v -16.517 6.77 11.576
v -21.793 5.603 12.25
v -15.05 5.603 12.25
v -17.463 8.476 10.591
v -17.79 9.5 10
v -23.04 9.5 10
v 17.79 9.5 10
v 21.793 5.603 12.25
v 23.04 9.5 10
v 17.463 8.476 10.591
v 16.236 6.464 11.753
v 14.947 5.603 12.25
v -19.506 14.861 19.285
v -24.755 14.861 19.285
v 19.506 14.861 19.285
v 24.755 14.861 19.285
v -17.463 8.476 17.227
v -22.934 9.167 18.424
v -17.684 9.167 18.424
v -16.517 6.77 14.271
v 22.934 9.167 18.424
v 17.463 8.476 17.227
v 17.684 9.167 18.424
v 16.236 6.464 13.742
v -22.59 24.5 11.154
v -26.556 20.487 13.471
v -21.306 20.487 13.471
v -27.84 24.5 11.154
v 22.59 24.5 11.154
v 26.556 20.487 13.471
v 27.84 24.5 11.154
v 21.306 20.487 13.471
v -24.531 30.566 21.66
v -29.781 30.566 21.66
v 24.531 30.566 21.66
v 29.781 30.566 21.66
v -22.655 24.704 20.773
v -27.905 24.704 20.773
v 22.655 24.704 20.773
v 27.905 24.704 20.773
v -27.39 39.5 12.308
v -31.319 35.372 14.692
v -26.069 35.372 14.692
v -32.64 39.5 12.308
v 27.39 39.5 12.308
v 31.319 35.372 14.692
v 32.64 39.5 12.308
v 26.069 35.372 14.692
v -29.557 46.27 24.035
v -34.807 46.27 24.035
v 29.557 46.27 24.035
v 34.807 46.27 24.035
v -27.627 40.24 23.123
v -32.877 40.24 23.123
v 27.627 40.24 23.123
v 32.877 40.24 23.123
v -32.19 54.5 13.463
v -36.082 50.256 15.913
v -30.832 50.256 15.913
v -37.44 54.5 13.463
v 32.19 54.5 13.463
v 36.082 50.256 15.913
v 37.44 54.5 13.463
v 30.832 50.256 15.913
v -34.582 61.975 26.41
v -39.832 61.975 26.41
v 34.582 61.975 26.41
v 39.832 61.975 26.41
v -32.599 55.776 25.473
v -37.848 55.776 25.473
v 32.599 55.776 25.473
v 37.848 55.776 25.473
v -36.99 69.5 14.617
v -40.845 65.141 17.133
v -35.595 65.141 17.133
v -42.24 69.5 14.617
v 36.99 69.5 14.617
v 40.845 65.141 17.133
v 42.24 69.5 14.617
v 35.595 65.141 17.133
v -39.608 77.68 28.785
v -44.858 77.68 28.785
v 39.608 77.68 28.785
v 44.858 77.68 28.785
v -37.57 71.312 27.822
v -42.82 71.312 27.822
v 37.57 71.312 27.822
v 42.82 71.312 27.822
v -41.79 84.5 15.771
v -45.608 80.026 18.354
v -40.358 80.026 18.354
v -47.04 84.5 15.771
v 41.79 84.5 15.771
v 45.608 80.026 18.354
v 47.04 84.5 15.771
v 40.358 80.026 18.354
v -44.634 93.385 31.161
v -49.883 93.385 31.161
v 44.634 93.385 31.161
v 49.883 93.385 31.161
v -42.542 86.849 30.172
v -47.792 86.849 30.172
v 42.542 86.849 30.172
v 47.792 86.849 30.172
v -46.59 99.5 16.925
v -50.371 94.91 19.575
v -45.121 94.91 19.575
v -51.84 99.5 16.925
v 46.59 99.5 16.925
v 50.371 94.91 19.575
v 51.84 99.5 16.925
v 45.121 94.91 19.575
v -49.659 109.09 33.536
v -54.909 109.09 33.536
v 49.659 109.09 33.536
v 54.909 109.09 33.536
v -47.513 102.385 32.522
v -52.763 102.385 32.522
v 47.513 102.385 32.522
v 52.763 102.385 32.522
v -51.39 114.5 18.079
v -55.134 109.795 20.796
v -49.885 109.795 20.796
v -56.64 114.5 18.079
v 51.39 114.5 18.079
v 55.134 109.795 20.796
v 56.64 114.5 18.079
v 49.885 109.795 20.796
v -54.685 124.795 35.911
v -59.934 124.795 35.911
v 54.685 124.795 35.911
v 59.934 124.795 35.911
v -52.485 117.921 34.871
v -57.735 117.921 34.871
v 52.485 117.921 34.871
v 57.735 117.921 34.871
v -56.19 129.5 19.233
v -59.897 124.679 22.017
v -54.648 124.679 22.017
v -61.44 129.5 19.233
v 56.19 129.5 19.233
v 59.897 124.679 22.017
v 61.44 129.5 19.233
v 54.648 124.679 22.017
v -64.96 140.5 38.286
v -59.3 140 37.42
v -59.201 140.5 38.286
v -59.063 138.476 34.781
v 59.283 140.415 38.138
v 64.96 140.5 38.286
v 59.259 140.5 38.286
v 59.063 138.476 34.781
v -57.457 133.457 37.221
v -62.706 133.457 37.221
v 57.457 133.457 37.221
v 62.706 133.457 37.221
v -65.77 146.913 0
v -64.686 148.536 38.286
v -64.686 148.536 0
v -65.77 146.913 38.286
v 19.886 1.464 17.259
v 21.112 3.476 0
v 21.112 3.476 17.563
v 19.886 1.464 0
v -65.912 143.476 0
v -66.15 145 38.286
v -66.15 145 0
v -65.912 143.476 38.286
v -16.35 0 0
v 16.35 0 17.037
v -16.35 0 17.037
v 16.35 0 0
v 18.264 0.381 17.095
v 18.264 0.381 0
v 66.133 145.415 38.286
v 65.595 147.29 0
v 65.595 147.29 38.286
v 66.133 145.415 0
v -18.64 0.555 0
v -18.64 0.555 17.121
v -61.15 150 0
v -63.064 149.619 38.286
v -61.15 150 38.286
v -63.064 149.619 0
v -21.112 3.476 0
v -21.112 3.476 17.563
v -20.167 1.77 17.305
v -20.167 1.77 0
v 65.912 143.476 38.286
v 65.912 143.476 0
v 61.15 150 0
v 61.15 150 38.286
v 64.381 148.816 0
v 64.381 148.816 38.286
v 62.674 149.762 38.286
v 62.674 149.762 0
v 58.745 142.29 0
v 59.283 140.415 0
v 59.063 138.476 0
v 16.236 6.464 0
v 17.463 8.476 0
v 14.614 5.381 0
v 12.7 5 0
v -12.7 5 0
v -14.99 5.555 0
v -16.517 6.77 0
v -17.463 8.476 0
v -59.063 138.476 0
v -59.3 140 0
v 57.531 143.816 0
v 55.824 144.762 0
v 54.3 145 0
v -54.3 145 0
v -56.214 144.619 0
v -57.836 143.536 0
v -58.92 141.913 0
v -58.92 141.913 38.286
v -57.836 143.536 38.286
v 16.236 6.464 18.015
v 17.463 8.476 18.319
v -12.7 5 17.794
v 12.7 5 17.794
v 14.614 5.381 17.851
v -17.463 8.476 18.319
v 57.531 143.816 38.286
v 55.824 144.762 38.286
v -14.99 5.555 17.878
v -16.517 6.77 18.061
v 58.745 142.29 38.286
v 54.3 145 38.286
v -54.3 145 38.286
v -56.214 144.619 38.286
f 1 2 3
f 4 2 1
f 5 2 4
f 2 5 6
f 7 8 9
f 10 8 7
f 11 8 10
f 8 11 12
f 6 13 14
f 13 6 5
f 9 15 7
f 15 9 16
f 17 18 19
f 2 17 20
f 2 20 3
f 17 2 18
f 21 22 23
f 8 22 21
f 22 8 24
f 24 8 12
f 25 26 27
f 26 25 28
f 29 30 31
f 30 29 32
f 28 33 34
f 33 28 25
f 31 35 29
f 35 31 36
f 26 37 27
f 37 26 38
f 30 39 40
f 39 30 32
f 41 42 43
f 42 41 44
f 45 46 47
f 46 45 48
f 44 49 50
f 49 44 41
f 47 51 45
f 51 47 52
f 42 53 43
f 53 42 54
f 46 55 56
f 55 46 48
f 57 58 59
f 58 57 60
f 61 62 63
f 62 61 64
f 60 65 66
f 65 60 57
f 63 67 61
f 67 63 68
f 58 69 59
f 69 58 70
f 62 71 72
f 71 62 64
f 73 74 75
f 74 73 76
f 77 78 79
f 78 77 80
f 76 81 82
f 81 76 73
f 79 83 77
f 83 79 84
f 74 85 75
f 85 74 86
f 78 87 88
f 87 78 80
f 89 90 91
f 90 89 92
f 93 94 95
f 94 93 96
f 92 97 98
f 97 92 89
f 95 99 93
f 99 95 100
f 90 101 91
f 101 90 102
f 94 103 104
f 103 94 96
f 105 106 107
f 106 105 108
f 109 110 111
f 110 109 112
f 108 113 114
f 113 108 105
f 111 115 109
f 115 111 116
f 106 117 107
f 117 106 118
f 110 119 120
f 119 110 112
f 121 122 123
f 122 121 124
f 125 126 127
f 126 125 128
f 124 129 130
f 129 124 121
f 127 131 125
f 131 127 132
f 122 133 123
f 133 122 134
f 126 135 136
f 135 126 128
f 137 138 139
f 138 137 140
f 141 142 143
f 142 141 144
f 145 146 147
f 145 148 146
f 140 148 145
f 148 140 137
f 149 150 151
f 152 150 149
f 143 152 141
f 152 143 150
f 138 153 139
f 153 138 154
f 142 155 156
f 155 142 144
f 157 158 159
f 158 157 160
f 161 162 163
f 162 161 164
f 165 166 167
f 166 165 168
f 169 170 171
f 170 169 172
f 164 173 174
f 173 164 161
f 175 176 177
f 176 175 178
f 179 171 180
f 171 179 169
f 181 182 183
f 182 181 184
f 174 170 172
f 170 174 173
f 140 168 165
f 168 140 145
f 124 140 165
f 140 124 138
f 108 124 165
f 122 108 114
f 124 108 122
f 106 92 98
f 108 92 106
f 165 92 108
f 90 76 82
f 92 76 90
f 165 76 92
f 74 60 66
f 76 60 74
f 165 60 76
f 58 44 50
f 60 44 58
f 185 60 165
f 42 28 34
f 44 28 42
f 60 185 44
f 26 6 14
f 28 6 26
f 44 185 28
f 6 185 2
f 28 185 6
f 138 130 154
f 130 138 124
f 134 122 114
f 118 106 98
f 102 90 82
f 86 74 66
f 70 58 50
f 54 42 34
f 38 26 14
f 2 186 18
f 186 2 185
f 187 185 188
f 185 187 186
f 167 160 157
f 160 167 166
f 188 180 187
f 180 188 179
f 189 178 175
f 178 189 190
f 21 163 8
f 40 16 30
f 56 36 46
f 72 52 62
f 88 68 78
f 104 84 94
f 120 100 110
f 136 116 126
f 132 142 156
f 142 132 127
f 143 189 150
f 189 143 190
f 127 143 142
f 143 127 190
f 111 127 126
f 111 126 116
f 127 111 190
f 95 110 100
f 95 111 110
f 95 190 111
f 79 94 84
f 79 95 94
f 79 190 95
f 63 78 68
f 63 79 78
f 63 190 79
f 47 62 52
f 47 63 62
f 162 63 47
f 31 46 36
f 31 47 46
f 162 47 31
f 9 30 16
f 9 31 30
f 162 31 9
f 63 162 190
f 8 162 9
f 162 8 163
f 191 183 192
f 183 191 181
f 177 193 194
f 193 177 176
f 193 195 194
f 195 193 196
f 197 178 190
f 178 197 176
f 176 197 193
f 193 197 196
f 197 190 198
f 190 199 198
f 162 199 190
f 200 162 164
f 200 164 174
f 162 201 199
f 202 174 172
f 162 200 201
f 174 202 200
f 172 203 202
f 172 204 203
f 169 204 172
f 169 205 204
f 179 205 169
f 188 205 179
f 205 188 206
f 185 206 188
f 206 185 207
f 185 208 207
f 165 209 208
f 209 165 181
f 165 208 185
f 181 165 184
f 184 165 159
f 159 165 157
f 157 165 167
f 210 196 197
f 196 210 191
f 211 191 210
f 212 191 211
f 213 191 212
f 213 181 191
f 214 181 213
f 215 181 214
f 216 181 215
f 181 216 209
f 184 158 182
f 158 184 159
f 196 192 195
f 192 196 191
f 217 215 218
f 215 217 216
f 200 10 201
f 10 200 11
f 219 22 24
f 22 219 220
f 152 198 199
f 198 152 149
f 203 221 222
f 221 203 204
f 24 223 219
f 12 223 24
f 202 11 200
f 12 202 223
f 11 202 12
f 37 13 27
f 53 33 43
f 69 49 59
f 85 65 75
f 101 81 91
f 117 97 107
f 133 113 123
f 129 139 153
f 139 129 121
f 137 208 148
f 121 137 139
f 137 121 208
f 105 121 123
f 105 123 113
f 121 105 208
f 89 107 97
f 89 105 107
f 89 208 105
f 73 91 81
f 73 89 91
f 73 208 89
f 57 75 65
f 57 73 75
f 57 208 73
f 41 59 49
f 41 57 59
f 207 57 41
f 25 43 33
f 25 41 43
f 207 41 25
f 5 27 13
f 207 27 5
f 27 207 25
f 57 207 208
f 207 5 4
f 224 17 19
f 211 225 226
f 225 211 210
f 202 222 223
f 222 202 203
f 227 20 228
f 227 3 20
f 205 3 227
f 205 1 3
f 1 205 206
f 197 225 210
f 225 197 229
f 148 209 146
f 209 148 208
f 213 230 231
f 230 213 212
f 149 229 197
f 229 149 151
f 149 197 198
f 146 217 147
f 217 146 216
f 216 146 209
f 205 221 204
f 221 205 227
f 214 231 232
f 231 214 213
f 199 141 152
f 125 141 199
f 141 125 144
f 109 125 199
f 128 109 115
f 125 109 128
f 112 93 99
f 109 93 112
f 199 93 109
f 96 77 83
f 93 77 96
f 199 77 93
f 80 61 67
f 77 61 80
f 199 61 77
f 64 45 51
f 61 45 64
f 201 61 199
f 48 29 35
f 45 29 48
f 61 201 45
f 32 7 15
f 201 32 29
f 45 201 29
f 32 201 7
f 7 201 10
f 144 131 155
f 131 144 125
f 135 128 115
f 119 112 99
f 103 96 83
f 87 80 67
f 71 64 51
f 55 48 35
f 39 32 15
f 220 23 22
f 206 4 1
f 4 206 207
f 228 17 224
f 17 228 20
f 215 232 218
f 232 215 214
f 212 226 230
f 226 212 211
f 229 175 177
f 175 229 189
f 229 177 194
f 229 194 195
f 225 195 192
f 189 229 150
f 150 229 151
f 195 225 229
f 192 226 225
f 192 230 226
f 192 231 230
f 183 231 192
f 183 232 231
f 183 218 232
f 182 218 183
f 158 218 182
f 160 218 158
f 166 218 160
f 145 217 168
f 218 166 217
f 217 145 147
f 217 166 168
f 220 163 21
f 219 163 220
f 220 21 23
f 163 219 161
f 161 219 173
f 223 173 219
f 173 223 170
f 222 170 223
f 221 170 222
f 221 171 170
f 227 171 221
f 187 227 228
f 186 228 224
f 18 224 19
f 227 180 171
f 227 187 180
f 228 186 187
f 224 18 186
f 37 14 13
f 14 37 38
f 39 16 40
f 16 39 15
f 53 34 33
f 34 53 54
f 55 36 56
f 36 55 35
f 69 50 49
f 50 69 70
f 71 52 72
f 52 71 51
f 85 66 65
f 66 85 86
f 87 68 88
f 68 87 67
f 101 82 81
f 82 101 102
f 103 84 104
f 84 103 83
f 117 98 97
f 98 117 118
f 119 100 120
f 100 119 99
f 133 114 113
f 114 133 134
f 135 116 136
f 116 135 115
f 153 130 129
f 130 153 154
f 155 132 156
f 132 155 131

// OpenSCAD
echo(version=version());


//Number of wrench slots
NumSlots = 9;
//Width of front slot
Slot1 = 4.5;
//Width of last (back) slot
SlotLast = 5.7;
//Depth of cut of the deepest (back) slot
SlotDepth = 22;
//Angle to rotate slots back
SlotAngle = 30;
//Spacing between each of the slots
SlotSpacing = 15;
//Slope of the bottom of each slot, in degrees
SlotBottomSlope = 4.4;
//Slope of the top of each slot, in degrees
SlotTopSlope = 8.6;
//Set width of front of model
FrontWidth = 40;
//Set width of back of model
BackWidth = 136;
//Sets additional thickness to front of model, offsetting from first slot
FrontOffset = 5;
//Sets additional thickness to bottom of model, offsetting underneath the slots
BottomOffset = 10; 

/* [Hidden] */

//used to calculate linear gradation of slot widths from front to back
SlotSizeStep = (SlotLast-Slot1)/NumSlots;

//widths of front and back parts of model
w1 = FrontWidth/2;
w2 = BackWidth/2;
//total length, front to back
l = (NumSlots+1)*(SlotSpacing);
//total height, bottom to top (height of back of model)
h = BottomOffset+ l * tan(SlotBottomSlope) + SlotDepth*cos(SlotAngle);

//Poly1 is extruded into the basic shape of the model
Poly1 = [[-w1,0],[w1,0],[w2,l],[-w2,l]];

//z1,y1 finds the top, back corner of the first slot
z1 = BottomOffset+SlotDepth*cos(SlotAngle); 
y1 = FrontOffset+Slot1+(SlotDepth*sin(SlotAngle));
//z2,y2 finds the top, back corner of the last slot
y2 = ((NumSlots-1)*SlotSpacing)+y1;
z2 = (y2-y1)*tan(SlotBottomSlope)+z1;
//z3 finds the intersection of the top slope with the front of the model. 
z3 = z2-(y2*tan(SlotTopSlope));
//Poly2 draws the polygon that will be extruded to remove and shape the top slope of the model (this polygon is the "side view" of what needs to be removed (differenced)
Poly2 = [[z2,y2],[z2,l],[h+1,l],[h+1,0],[z3,0]];


// 


difference(){
    linear_extrude(height=h)
        offset(r=5)
        offset(r=-5)
        polygon(Poly1);

    linear_extrude(height=h)
        offset(r=5)
        offset(r=-10)
        polygon(Poly1);

    translate([w2,0,0])
    rotate([0,-90,0])
    linear_extrude(height=BackWidth)
        polygon(Poly2);
    
    for (a =[0:NumSlots-1])
     translate([0, FrontOffset+Slot1+(a*SlotSpacing)+(0*SlotSizeStep), BottomOffset +((a)*tan(SlotBottomSlope)*SlotSpacing)])
        rotate([-SlotAngle,0,0])
            translate([-(BackWidth/2),-(Slot1+a*SlotSizeStep),0])
            cube([BackWidth,Slot1+(a*SlotSizeStep),SlotDepth], center=false); 
}

/*
difference(){


    translate([0, 0, 0])
        linear_extrude(height = 156, scale = [0.5,0.5])
            translate([0,20,0])
            square([136, 40], center=true);
    
    translate([0, 5, 5])
        linear_extrude(height = 156-10, scale = [0.5,0.5*(156-5)/156])
            translate([0,20,0])
            square([136-10, 40-10], center=true);
}
*/
